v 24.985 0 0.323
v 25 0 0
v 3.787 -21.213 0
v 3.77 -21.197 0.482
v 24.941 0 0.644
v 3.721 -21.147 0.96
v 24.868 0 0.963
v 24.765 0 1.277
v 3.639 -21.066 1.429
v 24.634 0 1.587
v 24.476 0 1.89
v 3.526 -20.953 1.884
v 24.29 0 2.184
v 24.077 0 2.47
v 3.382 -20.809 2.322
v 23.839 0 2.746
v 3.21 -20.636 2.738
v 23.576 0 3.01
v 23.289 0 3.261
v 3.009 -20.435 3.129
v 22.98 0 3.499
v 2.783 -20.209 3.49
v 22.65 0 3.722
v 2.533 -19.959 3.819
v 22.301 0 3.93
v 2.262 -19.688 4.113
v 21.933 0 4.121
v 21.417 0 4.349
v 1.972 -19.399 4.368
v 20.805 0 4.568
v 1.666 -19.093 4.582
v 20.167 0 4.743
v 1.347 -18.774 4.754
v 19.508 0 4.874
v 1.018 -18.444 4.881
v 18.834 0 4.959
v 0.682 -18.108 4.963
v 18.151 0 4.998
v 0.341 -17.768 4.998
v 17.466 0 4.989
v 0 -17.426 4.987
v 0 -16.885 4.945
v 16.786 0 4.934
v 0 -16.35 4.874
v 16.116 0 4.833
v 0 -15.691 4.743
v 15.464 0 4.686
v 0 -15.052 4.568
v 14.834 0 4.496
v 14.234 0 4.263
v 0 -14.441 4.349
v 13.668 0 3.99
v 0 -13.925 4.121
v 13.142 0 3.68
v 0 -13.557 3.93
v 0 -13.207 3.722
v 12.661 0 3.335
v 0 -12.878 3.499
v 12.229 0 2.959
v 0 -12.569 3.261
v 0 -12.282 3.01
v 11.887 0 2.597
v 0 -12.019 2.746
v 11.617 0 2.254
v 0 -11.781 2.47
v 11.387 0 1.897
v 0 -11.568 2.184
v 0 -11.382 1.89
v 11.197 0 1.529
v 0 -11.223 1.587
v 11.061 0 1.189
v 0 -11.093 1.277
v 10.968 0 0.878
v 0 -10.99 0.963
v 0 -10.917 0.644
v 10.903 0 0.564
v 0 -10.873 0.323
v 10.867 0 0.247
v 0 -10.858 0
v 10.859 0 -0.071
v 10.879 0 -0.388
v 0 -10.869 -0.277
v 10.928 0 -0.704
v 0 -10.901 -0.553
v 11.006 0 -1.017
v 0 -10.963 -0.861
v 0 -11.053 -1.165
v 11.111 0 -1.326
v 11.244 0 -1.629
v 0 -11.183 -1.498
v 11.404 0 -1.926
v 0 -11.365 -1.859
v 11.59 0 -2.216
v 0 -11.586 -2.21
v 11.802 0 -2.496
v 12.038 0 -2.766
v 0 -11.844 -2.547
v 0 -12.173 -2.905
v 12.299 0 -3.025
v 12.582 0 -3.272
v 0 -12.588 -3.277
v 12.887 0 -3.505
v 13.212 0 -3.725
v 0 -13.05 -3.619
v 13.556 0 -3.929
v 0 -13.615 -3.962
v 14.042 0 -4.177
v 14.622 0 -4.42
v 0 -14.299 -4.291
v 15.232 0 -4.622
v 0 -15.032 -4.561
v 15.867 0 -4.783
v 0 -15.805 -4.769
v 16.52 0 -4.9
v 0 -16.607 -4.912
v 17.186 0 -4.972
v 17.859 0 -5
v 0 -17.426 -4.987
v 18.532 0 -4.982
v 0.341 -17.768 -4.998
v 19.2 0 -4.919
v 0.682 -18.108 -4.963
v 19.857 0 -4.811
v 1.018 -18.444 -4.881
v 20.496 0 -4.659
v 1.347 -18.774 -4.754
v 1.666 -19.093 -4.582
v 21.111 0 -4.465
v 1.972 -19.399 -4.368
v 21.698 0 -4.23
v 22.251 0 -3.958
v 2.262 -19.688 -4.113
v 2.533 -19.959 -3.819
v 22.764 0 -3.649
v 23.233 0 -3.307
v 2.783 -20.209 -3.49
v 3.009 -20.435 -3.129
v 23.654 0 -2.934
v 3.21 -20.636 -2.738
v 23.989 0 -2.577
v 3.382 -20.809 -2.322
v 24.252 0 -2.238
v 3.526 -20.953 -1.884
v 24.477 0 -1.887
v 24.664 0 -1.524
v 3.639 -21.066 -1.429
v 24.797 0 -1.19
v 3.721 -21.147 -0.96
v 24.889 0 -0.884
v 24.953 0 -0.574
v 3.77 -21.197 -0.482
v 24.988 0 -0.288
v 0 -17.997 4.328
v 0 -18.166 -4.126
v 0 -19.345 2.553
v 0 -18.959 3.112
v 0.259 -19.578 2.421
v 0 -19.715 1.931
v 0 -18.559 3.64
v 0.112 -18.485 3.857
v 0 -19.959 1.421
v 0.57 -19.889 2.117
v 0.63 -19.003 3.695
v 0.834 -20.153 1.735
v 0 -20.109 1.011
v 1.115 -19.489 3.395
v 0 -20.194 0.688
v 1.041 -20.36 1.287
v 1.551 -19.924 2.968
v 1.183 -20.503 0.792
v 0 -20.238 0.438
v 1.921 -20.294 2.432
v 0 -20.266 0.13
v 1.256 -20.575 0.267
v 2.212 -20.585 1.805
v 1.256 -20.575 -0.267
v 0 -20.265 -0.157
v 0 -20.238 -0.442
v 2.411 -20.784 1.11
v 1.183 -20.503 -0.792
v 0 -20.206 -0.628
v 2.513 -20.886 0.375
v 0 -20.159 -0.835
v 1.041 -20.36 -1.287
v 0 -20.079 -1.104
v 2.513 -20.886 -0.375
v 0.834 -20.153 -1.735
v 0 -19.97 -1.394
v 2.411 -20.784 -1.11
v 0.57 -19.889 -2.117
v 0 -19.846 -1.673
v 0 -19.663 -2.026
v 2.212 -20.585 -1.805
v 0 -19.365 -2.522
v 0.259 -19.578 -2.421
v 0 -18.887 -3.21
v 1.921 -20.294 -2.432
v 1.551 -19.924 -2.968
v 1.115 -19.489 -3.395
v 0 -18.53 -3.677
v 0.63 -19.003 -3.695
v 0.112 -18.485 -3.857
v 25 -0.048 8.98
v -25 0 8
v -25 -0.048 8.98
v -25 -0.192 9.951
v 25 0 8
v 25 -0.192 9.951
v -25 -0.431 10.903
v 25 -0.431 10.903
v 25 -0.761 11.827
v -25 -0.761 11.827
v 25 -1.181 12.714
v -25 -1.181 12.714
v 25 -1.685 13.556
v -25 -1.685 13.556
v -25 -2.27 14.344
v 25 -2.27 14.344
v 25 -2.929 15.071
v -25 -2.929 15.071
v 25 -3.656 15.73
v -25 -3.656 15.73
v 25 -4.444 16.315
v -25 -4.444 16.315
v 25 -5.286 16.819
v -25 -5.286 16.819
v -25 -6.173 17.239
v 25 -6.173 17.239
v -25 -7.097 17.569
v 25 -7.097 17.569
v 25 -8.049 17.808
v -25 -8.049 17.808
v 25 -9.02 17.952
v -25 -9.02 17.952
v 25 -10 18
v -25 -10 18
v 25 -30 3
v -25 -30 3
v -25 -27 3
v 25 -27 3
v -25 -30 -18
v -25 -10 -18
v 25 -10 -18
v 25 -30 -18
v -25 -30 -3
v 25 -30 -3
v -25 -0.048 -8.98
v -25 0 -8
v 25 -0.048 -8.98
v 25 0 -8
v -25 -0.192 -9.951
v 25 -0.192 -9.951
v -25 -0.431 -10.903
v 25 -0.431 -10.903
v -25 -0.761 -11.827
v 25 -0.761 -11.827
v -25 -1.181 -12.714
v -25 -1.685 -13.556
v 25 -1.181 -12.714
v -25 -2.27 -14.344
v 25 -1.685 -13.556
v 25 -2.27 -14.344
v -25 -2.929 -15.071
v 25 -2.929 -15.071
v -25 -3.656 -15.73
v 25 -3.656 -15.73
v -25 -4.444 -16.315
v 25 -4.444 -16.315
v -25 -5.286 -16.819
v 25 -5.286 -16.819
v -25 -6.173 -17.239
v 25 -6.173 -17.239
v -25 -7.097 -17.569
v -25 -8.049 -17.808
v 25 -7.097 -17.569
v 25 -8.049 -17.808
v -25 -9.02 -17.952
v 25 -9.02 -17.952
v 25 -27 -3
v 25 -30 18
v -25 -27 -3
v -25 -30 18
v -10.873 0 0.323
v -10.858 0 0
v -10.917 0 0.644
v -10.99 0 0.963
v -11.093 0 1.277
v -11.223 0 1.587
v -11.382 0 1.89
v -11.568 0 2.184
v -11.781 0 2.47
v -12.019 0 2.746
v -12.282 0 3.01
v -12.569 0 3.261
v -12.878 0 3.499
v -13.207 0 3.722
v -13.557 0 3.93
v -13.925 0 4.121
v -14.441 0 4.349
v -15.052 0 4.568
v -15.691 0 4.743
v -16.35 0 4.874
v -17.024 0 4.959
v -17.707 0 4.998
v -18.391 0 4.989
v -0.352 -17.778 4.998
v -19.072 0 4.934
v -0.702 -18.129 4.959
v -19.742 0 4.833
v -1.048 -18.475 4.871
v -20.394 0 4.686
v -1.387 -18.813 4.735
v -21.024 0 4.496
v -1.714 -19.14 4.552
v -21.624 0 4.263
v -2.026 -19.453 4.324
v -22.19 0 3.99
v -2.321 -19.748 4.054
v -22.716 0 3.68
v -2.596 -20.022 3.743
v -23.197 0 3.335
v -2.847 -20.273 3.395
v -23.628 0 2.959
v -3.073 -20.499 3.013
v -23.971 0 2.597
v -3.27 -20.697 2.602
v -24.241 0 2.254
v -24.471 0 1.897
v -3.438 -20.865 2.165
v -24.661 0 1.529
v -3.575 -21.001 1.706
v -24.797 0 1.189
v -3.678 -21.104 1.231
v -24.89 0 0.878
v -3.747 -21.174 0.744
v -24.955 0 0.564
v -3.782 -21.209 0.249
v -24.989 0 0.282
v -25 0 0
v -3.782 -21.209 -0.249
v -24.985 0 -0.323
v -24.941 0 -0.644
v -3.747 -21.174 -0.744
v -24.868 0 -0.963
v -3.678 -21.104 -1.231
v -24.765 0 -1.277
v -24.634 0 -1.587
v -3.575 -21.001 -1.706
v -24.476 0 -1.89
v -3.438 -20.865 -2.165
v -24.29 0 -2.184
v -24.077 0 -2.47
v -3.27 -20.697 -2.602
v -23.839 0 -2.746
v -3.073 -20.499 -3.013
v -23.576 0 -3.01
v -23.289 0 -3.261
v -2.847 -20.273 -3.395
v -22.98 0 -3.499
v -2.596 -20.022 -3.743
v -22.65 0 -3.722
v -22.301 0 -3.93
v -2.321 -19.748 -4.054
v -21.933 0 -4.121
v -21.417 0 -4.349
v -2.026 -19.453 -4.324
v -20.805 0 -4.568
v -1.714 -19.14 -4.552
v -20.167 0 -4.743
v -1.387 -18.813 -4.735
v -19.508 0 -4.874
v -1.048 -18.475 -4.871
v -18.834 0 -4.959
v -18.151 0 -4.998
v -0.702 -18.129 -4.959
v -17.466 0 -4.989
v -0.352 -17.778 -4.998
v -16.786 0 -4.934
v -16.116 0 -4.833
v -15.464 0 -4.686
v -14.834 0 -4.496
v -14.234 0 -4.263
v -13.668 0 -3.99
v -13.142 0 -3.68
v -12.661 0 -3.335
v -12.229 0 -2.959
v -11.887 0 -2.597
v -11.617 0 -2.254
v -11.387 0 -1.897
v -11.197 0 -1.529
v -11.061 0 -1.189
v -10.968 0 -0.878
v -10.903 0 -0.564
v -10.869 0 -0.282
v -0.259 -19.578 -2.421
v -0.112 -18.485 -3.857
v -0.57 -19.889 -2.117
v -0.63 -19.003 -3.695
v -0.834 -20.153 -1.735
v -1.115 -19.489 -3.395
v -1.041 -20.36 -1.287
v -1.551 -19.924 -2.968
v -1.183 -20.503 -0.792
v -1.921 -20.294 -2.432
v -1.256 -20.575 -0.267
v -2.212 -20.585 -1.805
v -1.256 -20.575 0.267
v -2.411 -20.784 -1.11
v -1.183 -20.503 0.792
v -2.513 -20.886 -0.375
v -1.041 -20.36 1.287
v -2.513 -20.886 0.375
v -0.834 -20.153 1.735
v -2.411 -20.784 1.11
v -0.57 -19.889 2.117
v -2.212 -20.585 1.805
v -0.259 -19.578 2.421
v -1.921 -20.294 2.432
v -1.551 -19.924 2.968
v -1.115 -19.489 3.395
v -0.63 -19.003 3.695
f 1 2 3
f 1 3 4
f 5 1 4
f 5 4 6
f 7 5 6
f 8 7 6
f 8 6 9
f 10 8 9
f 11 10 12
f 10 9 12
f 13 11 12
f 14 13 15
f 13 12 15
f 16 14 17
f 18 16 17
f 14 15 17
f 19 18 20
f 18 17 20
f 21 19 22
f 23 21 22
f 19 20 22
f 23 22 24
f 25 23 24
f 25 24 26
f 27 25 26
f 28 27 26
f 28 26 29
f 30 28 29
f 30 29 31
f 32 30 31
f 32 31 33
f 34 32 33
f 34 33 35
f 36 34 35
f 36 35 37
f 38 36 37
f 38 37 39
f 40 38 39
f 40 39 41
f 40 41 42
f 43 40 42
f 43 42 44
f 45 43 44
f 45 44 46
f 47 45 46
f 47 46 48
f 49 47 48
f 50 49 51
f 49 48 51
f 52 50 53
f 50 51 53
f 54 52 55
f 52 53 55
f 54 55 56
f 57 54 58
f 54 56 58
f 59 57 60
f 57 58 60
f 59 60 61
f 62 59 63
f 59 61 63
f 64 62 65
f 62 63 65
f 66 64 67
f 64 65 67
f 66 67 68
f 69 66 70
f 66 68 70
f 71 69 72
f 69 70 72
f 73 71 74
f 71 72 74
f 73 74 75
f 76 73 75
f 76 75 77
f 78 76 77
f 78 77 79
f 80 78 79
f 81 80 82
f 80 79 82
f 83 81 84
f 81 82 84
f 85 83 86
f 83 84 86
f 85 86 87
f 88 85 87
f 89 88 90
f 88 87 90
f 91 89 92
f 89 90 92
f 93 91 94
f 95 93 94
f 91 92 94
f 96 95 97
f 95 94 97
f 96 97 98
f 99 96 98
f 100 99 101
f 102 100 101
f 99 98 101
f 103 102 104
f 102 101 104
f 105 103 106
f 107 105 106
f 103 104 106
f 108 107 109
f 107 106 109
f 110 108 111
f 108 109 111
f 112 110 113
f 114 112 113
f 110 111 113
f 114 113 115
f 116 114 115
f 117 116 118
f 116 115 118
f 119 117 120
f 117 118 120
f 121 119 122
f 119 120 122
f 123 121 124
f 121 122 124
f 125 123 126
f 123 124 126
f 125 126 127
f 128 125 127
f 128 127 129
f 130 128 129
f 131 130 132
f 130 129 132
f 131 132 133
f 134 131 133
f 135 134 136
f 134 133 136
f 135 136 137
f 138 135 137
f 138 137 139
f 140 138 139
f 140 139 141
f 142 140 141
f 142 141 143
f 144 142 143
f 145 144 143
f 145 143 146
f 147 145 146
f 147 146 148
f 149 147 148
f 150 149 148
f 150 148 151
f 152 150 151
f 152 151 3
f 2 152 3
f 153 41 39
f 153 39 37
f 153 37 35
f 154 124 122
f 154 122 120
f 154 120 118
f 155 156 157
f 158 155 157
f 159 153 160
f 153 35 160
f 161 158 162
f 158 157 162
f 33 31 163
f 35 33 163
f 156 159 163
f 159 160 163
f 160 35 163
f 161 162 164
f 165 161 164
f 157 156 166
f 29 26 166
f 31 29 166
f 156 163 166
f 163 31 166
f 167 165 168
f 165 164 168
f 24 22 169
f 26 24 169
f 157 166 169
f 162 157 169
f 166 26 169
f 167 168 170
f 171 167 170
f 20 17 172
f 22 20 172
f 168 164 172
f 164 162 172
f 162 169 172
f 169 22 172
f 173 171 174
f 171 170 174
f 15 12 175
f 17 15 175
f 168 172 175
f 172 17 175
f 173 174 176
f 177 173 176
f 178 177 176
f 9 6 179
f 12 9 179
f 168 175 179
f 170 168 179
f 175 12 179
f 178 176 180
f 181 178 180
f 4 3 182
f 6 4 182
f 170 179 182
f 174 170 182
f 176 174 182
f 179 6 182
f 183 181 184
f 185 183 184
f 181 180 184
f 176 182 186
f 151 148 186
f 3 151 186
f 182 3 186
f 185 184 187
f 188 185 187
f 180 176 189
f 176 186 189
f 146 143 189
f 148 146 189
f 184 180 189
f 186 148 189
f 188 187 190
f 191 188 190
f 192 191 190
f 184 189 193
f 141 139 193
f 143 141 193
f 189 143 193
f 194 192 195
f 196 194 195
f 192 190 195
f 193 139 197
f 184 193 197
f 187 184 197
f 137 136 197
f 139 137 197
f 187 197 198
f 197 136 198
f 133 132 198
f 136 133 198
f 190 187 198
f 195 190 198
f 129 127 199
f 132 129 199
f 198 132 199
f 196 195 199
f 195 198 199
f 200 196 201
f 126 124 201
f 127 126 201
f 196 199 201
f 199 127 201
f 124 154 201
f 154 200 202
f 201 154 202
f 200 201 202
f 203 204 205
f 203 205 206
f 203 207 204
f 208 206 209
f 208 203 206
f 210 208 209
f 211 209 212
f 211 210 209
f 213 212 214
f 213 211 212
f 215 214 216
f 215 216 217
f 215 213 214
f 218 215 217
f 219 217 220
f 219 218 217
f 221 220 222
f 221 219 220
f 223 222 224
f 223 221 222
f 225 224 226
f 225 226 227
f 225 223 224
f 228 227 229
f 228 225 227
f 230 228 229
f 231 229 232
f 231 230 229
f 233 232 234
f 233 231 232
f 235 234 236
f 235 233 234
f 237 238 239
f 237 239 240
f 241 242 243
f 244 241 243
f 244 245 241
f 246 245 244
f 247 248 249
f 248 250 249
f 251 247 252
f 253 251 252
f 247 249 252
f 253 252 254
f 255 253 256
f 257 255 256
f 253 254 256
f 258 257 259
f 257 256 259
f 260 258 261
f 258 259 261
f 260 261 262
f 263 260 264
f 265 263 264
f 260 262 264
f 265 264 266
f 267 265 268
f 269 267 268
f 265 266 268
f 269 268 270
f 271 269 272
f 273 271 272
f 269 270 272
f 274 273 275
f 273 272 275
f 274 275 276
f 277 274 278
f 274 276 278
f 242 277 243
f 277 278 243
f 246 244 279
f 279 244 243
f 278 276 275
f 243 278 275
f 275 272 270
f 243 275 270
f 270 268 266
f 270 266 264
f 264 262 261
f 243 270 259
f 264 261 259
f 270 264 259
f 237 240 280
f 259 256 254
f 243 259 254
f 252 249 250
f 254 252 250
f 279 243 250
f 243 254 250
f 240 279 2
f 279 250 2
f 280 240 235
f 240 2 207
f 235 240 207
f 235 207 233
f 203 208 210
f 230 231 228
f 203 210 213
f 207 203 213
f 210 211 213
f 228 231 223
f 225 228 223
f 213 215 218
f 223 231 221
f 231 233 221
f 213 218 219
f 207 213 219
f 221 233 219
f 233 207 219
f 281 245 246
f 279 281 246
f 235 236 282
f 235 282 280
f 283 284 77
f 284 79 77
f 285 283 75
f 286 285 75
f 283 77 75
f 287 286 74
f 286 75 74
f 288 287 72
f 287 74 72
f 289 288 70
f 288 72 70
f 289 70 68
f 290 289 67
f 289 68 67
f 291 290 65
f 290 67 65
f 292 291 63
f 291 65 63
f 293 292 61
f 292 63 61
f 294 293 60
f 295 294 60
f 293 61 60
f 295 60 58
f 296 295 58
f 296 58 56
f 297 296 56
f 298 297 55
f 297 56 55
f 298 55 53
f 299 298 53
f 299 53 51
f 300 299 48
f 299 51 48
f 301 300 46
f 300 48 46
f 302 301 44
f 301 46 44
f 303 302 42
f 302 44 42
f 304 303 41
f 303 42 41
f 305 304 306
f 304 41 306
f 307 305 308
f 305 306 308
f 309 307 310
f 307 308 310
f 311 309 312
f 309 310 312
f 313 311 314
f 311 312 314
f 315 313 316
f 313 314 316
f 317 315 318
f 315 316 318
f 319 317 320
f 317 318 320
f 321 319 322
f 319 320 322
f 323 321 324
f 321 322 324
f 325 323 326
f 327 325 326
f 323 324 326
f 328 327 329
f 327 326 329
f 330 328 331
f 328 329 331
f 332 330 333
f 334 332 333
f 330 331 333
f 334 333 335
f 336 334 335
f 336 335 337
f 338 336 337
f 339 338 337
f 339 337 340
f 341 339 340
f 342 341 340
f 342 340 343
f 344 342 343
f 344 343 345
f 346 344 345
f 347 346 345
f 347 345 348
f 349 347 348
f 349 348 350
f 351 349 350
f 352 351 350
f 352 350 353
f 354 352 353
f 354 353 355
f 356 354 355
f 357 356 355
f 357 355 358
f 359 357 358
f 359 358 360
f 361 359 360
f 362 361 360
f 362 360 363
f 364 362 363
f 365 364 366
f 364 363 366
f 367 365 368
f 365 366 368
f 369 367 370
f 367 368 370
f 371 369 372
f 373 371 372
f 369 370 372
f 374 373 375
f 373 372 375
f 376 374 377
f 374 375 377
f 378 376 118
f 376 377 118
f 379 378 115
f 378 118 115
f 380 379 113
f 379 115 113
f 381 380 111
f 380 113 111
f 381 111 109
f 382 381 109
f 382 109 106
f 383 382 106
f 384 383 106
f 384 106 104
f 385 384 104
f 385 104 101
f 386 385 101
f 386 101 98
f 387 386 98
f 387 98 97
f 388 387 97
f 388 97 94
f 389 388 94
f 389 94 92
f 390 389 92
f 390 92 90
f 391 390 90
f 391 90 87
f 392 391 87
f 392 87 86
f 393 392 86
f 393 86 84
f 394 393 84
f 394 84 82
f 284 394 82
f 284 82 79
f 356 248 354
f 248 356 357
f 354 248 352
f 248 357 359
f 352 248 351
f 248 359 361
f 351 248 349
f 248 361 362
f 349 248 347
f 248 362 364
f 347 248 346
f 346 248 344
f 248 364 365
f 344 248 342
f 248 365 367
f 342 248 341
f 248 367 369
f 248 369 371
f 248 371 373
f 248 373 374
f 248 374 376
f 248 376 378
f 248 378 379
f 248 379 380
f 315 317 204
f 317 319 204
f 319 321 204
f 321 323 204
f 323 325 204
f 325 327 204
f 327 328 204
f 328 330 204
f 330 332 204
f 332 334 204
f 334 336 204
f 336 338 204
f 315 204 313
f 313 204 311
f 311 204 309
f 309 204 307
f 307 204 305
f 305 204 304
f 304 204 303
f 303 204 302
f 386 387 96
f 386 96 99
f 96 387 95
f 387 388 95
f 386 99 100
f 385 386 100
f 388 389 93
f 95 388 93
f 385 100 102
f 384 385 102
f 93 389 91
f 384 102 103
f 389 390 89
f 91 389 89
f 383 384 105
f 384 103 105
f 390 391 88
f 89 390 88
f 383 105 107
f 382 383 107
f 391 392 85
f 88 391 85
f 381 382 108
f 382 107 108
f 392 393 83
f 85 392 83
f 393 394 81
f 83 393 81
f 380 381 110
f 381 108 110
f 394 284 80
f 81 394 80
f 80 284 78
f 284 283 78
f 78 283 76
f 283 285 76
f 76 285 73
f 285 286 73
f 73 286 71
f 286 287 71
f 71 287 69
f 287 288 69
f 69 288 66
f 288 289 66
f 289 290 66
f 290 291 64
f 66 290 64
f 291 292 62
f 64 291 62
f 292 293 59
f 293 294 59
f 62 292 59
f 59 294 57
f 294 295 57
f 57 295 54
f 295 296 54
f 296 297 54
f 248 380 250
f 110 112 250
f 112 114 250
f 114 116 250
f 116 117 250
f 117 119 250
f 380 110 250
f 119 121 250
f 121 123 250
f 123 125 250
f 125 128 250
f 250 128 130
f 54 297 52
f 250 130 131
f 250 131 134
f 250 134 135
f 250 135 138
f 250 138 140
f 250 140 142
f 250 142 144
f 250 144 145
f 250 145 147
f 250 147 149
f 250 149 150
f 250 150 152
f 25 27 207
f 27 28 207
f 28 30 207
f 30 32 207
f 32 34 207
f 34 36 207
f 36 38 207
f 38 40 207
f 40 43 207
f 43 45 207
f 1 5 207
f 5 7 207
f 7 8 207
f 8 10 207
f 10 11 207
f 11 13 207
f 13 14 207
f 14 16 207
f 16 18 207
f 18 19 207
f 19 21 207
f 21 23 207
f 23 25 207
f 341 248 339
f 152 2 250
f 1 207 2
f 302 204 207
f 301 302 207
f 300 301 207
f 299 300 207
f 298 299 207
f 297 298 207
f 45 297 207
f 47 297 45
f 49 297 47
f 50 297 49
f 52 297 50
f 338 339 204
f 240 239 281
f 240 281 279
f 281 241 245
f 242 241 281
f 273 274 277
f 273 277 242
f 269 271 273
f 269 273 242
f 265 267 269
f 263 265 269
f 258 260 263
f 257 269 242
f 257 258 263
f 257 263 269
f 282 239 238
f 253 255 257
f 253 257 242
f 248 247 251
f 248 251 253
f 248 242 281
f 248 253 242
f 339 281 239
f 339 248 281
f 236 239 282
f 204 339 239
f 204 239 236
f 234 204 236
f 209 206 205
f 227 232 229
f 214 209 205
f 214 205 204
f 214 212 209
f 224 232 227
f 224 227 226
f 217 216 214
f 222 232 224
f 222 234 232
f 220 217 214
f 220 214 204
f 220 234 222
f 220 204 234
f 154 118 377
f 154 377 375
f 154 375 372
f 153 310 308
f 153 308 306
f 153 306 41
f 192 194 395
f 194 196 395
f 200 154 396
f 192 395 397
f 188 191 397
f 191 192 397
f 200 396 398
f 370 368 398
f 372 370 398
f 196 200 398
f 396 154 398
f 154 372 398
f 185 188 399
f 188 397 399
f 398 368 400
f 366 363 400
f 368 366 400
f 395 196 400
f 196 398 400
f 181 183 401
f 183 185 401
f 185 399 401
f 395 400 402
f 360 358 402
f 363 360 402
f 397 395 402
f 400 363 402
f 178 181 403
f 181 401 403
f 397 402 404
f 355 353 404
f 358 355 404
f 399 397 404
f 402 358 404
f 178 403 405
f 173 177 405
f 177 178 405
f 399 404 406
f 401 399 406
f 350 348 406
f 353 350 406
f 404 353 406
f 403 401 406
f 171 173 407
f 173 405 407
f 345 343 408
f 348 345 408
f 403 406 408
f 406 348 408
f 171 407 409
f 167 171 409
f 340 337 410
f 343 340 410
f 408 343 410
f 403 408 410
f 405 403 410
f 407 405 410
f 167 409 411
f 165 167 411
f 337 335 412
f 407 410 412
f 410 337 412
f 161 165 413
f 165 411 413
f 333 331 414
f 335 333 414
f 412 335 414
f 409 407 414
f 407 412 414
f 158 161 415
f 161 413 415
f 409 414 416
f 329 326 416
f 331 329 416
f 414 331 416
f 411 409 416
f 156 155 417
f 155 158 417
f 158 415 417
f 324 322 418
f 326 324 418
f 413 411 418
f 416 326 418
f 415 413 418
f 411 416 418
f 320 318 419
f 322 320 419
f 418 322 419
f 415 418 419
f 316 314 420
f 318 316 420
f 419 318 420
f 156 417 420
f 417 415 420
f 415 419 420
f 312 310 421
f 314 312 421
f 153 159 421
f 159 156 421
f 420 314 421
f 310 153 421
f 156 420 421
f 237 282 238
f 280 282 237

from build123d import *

# Parameters (mm, degrees)
F0_W     = 50
F0_H     = 36
F1_DEPTH = 30
F4_D     = 10
F4_DEPTH = 20
F4_START = 10
F4_TIP   = 3.0043030951
F7_D     = 10
F7_DEPTH = 20
F7_START = 10
F7_TIP   = 3.0043030951
F8_W     = 50
F8_H     = 6
F9_DEPTH = 3
F10_R    = 10


with BuildPart() as f1:
    # F0 (on Front) → F1 (new body)
    with BuildSketch(Plane.XZ):
        Rectangle(F0_W, F0_H)
    extrude(amount=F1_DEPTH)

    # F4
    # its depths count from where the whole tool has entered the part; down to there all is cleared
    with Locations(Plane(origin=(-12.5, 12.5, 0), x_dir=(-0.7071067812, -0.7071067812, 0), z_dir=(-0.7071067812, 0.7071067812, 0)).offset(-F4_START)):
        with Locations((12.6776695297, 0)):
            Hole(F4_D / 2, depth=F4_DEPTH)
            with Locations((0, 0, -(F4_DEPTH + F4_TIP / 2))):  # 118° drill point
                Cone(0, F4_D / 2, F4_TIP, mode=Mode.SUBTRACT)

    # F7
    # its depths count from where the whole tool has entered the part; down to there all is cleared
    with Locations(Plane(origin=(12.5, 12.5, 0), x_dir=(-0.7071067812, 0.7071067812, 0), z_dir=(0.7071067812, 0.7071067812, 0)).offset(-F7_START)):
        with Locations((-12.6776695297, 0)):
            Hole(F7_D / 2, depth=F7_DEPTH)
            with Locations((0, 0, -(F7_DEPTH + F7_TIP / 2))):  # 118° drill point
                Cone(0, F7_D / 2, F7_TIP, mode=Mode.SUBTRACT)

    # F8 (on face) → F9 (cut)
    with BuildSketch(Plane.XZ.offset(30)):
        Rectangle(F8_W, F8_H)
    extrude(amount=-F9_DEPTH, mode=Mode.SUBTRACT)

    # F10
    f10_edges = [f1.edges().sort_by_distance(p)[0] for p in [
        (0, 0, -18),
        (0, 0, 18),
    ]]
    fillet(f10_edges, radius=F10_R)


solid = f1.part
